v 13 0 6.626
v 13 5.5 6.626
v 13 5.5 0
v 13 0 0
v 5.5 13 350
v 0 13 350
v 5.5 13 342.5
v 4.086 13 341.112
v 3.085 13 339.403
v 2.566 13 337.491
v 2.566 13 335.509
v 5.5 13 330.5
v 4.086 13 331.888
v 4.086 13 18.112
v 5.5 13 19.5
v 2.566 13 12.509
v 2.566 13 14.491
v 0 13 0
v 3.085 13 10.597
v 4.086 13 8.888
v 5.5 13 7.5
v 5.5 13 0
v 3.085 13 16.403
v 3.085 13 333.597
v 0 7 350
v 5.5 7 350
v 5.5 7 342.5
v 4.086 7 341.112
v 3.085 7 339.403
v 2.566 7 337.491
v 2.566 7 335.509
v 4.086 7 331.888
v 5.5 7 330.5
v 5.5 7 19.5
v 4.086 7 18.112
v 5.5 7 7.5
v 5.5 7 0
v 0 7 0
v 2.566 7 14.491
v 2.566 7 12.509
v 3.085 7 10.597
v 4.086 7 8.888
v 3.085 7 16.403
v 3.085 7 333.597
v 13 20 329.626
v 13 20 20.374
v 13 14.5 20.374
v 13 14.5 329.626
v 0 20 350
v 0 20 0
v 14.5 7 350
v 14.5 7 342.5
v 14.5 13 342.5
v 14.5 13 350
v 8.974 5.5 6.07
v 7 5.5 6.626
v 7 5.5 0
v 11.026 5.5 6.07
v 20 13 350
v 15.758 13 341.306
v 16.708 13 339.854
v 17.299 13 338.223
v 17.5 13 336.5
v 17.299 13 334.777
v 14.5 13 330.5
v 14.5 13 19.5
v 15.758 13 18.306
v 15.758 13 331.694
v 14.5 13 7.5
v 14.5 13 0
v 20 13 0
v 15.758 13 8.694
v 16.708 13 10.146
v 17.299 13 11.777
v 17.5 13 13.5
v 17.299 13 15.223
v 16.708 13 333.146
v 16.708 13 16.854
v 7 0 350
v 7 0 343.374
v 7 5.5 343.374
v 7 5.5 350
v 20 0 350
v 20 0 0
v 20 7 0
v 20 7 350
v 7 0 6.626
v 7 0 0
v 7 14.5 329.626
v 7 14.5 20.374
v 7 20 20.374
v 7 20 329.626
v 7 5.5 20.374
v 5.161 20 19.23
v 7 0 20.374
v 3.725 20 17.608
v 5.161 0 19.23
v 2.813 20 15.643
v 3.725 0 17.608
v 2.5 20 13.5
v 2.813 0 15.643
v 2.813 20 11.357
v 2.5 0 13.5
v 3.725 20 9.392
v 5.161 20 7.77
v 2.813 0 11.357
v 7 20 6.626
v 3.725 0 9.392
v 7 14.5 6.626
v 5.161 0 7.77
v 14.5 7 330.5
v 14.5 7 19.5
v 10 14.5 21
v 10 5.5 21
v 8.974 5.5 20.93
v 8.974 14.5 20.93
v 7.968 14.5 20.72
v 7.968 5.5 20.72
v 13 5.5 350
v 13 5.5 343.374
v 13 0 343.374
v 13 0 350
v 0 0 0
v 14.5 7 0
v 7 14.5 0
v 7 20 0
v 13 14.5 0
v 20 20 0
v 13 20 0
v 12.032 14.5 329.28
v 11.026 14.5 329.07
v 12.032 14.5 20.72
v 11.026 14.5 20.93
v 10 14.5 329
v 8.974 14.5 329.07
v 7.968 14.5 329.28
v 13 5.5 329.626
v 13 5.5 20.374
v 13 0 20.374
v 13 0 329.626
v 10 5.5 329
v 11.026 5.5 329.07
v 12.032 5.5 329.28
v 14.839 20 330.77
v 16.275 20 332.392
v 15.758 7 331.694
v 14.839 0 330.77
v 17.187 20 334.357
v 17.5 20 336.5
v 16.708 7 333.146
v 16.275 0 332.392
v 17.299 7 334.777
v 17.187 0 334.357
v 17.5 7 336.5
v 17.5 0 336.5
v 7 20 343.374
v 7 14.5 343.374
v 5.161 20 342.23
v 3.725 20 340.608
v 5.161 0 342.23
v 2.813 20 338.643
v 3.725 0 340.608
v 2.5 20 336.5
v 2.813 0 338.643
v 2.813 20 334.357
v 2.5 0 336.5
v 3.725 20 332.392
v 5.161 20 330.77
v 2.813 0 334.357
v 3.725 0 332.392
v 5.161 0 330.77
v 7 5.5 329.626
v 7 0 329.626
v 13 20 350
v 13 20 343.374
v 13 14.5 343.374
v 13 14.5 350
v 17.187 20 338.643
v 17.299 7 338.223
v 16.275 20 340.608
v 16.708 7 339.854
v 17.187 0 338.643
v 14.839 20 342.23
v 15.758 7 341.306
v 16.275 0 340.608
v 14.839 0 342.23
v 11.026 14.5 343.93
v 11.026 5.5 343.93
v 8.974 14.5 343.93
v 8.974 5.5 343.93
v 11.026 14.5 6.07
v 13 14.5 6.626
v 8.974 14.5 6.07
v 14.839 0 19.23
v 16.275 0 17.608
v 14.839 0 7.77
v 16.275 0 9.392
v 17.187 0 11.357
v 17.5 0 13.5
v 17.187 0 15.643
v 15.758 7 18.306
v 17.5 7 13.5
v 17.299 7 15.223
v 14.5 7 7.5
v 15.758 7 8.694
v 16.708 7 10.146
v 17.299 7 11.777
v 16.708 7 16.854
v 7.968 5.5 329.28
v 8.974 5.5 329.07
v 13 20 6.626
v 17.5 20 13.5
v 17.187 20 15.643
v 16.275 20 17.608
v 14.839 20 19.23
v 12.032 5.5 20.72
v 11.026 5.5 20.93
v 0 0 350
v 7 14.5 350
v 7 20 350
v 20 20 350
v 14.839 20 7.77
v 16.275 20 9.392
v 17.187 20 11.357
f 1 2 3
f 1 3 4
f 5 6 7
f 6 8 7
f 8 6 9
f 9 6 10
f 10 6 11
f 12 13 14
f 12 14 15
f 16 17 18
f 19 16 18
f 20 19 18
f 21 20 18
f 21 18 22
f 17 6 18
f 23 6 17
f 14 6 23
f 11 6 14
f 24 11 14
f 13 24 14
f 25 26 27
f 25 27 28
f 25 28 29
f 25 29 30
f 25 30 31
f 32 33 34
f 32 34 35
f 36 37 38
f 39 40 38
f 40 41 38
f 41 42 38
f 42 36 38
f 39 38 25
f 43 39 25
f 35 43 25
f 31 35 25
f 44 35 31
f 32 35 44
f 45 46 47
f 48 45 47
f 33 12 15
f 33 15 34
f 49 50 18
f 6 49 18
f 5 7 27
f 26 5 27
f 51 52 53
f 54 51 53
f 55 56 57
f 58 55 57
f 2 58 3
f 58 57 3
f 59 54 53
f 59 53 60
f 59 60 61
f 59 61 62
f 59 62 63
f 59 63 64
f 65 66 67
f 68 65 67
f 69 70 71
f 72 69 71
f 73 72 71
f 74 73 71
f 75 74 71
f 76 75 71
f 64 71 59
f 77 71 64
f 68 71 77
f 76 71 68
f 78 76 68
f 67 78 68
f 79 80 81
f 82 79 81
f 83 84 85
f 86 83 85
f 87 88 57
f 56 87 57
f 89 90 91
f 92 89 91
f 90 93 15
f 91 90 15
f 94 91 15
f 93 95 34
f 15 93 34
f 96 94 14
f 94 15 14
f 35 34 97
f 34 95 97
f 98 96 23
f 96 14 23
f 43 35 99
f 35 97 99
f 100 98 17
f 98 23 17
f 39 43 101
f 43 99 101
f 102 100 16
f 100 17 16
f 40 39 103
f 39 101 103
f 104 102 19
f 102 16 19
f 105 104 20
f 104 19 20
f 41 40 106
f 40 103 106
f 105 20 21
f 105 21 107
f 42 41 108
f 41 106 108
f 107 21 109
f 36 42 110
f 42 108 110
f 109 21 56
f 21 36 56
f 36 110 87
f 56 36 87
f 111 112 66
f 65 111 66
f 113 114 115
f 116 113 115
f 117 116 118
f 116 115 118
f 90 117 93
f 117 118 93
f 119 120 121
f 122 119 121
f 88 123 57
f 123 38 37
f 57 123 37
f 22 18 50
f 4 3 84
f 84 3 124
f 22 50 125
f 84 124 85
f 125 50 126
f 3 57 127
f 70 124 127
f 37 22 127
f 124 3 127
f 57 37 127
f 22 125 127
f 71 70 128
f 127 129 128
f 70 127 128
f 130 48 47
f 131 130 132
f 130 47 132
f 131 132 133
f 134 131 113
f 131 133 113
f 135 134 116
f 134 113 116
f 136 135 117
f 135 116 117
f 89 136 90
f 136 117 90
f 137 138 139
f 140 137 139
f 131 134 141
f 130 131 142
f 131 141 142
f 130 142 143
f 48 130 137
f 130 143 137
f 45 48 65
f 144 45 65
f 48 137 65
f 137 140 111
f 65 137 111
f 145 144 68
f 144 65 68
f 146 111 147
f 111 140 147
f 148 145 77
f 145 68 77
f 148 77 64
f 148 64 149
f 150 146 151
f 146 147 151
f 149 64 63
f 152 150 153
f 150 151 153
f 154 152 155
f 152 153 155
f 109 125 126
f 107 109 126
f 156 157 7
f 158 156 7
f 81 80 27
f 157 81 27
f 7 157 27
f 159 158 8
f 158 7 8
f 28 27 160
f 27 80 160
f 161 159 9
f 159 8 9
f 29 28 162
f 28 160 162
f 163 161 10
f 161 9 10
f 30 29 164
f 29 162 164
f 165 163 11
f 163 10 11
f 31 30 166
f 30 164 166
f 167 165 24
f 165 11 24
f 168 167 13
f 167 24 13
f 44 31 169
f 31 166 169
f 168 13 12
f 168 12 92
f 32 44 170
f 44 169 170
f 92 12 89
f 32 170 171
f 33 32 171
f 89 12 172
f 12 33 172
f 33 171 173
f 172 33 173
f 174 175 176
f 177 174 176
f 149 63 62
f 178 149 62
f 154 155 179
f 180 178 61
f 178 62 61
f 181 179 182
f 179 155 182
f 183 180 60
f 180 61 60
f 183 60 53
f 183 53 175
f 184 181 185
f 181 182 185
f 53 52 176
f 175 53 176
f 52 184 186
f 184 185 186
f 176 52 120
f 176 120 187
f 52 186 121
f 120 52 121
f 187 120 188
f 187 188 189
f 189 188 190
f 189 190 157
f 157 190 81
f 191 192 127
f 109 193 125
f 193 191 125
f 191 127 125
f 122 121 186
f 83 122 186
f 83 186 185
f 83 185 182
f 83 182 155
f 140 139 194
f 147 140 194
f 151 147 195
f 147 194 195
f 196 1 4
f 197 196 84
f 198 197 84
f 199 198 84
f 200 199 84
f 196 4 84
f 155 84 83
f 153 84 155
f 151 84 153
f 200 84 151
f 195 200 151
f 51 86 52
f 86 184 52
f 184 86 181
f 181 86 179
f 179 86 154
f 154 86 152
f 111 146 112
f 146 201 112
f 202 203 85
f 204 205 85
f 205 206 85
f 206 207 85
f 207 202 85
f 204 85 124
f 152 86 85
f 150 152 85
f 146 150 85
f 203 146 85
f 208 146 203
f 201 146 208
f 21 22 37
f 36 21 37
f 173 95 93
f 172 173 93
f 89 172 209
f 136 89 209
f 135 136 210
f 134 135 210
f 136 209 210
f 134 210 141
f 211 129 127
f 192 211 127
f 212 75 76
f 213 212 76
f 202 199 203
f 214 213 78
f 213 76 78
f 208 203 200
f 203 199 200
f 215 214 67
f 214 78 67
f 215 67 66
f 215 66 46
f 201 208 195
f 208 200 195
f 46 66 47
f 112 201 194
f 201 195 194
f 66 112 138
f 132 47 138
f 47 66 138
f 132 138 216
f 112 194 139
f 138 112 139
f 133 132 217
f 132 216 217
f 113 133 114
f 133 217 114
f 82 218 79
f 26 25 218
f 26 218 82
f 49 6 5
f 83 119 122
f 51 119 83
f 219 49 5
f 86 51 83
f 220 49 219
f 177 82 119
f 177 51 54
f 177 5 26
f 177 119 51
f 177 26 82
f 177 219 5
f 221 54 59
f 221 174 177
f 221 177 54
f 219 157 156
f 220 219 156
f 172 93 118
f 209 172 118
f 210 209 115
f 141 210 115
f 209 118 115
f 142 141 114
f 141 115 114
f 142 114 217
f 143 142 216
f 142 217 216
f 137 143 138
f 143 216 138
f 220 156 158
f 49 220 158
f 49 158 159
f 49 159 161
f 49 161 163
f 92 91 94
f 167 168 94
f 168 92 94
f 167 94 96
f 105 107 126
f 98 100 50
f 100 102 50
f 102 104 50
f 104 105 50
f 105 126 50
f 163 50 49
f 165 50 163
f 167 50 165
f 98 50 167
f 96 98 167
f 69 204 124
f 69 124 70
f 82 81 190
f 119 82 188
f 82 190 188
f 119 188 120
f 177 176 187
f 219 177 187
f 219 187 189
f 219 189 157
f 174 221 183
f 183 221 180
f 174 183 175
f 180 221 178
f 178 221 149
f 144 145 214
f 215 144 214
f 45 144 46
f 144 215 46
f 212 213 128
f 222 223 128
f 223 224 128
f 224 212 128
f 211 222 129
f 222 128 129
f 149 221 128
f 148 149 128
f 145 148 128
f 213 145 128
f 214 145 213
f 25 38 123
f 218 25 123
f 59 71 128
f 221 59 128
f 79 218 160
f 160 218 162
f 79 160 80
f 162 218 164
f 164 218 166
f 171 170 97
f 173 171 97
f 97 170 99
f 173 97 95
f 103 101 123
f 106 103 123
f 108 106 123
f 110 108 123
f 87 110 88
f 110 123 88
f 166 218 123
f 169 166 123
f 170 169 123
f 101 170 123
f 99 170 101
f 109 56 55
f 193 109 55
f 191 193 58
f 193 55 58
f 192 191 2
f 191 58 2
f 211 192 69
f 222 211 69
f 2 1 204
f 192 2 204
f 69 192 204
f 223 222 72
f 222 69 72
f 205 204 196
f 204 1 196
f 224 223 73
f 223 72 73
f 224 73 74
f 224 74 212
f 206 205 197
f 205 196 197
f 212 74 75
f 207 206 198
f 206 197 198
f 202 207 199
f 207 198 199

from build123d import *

# Parameters (mm, degrees)
F1_DEPTH = 350
F3_DEPTH = 25


with BuildPart() as f1:
    # F0 (on Top) → F1 (new body)
    with BuildSketch(Plane.XY):
        Polygon((0, 7), (0, 0), (7, 0), (7, 5.5), (13, 5.5), (13, 0), (20, 0), (20, 7), (14.5, 7), (14.5, 13), (20, 13), (20, 20), (13, 20), (13, 14.5), (7, 14.5), (7, 20), (0, 20), (0, 13), (5.5, 13), (5.5, 7), align=None)
    extrude(amount=F1_DEPTH)

    # F2 (on face) → F3 (cut)
    with BuildSketch(Plane.XZ):
        with BuildLine():
            ThreePointArc((7, 329.6261364576), (8.4676776723, 329.158202653), (10, 329))
            ThreePointArc((10, 329), (15.3033008589, 331.1966991411), (17.5, 336.5))
            ThreePointArc((17.5, 336.5), (14.1079191813, 342.774950199), (7, 343.3738635424))
            Line((7, 343.3738635424), (7, 329.6261364576))
        make_face()
        with BuildLine():
            ThreePointArc((7, 343.3738635424), (2.5, 336.5), (7, 329.6261364576))
            Line((7, 329.6261364576), (7, 343.3738635424))
        make_face()
        with BuildLine():
            Line((7, 6.6261364576), (7, 20.3738635424))
            ThreePointArc((7, 20.3738635424), (2.5, 13.5), (7, 6.6261364576))
        make_face()
        with BuildLine():
            ThreePointArc((10, 21), (8.4676776723, 20.841797347), (7, 20.3738635424))
            Line((7, 20.3738635424), (7, 6.6261364576))
            ThreePointArc((7, 6.6261364576), (14.1079191813, 7.225049801), (17.5, 13.5))
            ThreePointArc((17.5, 13.5), (15.3033008589, 18.8033008589), (10, 21))
        make_face()
    extrude(amount=-F3_DEPTH, mode=Mode.SUBTRACT)


solid = f1.part
